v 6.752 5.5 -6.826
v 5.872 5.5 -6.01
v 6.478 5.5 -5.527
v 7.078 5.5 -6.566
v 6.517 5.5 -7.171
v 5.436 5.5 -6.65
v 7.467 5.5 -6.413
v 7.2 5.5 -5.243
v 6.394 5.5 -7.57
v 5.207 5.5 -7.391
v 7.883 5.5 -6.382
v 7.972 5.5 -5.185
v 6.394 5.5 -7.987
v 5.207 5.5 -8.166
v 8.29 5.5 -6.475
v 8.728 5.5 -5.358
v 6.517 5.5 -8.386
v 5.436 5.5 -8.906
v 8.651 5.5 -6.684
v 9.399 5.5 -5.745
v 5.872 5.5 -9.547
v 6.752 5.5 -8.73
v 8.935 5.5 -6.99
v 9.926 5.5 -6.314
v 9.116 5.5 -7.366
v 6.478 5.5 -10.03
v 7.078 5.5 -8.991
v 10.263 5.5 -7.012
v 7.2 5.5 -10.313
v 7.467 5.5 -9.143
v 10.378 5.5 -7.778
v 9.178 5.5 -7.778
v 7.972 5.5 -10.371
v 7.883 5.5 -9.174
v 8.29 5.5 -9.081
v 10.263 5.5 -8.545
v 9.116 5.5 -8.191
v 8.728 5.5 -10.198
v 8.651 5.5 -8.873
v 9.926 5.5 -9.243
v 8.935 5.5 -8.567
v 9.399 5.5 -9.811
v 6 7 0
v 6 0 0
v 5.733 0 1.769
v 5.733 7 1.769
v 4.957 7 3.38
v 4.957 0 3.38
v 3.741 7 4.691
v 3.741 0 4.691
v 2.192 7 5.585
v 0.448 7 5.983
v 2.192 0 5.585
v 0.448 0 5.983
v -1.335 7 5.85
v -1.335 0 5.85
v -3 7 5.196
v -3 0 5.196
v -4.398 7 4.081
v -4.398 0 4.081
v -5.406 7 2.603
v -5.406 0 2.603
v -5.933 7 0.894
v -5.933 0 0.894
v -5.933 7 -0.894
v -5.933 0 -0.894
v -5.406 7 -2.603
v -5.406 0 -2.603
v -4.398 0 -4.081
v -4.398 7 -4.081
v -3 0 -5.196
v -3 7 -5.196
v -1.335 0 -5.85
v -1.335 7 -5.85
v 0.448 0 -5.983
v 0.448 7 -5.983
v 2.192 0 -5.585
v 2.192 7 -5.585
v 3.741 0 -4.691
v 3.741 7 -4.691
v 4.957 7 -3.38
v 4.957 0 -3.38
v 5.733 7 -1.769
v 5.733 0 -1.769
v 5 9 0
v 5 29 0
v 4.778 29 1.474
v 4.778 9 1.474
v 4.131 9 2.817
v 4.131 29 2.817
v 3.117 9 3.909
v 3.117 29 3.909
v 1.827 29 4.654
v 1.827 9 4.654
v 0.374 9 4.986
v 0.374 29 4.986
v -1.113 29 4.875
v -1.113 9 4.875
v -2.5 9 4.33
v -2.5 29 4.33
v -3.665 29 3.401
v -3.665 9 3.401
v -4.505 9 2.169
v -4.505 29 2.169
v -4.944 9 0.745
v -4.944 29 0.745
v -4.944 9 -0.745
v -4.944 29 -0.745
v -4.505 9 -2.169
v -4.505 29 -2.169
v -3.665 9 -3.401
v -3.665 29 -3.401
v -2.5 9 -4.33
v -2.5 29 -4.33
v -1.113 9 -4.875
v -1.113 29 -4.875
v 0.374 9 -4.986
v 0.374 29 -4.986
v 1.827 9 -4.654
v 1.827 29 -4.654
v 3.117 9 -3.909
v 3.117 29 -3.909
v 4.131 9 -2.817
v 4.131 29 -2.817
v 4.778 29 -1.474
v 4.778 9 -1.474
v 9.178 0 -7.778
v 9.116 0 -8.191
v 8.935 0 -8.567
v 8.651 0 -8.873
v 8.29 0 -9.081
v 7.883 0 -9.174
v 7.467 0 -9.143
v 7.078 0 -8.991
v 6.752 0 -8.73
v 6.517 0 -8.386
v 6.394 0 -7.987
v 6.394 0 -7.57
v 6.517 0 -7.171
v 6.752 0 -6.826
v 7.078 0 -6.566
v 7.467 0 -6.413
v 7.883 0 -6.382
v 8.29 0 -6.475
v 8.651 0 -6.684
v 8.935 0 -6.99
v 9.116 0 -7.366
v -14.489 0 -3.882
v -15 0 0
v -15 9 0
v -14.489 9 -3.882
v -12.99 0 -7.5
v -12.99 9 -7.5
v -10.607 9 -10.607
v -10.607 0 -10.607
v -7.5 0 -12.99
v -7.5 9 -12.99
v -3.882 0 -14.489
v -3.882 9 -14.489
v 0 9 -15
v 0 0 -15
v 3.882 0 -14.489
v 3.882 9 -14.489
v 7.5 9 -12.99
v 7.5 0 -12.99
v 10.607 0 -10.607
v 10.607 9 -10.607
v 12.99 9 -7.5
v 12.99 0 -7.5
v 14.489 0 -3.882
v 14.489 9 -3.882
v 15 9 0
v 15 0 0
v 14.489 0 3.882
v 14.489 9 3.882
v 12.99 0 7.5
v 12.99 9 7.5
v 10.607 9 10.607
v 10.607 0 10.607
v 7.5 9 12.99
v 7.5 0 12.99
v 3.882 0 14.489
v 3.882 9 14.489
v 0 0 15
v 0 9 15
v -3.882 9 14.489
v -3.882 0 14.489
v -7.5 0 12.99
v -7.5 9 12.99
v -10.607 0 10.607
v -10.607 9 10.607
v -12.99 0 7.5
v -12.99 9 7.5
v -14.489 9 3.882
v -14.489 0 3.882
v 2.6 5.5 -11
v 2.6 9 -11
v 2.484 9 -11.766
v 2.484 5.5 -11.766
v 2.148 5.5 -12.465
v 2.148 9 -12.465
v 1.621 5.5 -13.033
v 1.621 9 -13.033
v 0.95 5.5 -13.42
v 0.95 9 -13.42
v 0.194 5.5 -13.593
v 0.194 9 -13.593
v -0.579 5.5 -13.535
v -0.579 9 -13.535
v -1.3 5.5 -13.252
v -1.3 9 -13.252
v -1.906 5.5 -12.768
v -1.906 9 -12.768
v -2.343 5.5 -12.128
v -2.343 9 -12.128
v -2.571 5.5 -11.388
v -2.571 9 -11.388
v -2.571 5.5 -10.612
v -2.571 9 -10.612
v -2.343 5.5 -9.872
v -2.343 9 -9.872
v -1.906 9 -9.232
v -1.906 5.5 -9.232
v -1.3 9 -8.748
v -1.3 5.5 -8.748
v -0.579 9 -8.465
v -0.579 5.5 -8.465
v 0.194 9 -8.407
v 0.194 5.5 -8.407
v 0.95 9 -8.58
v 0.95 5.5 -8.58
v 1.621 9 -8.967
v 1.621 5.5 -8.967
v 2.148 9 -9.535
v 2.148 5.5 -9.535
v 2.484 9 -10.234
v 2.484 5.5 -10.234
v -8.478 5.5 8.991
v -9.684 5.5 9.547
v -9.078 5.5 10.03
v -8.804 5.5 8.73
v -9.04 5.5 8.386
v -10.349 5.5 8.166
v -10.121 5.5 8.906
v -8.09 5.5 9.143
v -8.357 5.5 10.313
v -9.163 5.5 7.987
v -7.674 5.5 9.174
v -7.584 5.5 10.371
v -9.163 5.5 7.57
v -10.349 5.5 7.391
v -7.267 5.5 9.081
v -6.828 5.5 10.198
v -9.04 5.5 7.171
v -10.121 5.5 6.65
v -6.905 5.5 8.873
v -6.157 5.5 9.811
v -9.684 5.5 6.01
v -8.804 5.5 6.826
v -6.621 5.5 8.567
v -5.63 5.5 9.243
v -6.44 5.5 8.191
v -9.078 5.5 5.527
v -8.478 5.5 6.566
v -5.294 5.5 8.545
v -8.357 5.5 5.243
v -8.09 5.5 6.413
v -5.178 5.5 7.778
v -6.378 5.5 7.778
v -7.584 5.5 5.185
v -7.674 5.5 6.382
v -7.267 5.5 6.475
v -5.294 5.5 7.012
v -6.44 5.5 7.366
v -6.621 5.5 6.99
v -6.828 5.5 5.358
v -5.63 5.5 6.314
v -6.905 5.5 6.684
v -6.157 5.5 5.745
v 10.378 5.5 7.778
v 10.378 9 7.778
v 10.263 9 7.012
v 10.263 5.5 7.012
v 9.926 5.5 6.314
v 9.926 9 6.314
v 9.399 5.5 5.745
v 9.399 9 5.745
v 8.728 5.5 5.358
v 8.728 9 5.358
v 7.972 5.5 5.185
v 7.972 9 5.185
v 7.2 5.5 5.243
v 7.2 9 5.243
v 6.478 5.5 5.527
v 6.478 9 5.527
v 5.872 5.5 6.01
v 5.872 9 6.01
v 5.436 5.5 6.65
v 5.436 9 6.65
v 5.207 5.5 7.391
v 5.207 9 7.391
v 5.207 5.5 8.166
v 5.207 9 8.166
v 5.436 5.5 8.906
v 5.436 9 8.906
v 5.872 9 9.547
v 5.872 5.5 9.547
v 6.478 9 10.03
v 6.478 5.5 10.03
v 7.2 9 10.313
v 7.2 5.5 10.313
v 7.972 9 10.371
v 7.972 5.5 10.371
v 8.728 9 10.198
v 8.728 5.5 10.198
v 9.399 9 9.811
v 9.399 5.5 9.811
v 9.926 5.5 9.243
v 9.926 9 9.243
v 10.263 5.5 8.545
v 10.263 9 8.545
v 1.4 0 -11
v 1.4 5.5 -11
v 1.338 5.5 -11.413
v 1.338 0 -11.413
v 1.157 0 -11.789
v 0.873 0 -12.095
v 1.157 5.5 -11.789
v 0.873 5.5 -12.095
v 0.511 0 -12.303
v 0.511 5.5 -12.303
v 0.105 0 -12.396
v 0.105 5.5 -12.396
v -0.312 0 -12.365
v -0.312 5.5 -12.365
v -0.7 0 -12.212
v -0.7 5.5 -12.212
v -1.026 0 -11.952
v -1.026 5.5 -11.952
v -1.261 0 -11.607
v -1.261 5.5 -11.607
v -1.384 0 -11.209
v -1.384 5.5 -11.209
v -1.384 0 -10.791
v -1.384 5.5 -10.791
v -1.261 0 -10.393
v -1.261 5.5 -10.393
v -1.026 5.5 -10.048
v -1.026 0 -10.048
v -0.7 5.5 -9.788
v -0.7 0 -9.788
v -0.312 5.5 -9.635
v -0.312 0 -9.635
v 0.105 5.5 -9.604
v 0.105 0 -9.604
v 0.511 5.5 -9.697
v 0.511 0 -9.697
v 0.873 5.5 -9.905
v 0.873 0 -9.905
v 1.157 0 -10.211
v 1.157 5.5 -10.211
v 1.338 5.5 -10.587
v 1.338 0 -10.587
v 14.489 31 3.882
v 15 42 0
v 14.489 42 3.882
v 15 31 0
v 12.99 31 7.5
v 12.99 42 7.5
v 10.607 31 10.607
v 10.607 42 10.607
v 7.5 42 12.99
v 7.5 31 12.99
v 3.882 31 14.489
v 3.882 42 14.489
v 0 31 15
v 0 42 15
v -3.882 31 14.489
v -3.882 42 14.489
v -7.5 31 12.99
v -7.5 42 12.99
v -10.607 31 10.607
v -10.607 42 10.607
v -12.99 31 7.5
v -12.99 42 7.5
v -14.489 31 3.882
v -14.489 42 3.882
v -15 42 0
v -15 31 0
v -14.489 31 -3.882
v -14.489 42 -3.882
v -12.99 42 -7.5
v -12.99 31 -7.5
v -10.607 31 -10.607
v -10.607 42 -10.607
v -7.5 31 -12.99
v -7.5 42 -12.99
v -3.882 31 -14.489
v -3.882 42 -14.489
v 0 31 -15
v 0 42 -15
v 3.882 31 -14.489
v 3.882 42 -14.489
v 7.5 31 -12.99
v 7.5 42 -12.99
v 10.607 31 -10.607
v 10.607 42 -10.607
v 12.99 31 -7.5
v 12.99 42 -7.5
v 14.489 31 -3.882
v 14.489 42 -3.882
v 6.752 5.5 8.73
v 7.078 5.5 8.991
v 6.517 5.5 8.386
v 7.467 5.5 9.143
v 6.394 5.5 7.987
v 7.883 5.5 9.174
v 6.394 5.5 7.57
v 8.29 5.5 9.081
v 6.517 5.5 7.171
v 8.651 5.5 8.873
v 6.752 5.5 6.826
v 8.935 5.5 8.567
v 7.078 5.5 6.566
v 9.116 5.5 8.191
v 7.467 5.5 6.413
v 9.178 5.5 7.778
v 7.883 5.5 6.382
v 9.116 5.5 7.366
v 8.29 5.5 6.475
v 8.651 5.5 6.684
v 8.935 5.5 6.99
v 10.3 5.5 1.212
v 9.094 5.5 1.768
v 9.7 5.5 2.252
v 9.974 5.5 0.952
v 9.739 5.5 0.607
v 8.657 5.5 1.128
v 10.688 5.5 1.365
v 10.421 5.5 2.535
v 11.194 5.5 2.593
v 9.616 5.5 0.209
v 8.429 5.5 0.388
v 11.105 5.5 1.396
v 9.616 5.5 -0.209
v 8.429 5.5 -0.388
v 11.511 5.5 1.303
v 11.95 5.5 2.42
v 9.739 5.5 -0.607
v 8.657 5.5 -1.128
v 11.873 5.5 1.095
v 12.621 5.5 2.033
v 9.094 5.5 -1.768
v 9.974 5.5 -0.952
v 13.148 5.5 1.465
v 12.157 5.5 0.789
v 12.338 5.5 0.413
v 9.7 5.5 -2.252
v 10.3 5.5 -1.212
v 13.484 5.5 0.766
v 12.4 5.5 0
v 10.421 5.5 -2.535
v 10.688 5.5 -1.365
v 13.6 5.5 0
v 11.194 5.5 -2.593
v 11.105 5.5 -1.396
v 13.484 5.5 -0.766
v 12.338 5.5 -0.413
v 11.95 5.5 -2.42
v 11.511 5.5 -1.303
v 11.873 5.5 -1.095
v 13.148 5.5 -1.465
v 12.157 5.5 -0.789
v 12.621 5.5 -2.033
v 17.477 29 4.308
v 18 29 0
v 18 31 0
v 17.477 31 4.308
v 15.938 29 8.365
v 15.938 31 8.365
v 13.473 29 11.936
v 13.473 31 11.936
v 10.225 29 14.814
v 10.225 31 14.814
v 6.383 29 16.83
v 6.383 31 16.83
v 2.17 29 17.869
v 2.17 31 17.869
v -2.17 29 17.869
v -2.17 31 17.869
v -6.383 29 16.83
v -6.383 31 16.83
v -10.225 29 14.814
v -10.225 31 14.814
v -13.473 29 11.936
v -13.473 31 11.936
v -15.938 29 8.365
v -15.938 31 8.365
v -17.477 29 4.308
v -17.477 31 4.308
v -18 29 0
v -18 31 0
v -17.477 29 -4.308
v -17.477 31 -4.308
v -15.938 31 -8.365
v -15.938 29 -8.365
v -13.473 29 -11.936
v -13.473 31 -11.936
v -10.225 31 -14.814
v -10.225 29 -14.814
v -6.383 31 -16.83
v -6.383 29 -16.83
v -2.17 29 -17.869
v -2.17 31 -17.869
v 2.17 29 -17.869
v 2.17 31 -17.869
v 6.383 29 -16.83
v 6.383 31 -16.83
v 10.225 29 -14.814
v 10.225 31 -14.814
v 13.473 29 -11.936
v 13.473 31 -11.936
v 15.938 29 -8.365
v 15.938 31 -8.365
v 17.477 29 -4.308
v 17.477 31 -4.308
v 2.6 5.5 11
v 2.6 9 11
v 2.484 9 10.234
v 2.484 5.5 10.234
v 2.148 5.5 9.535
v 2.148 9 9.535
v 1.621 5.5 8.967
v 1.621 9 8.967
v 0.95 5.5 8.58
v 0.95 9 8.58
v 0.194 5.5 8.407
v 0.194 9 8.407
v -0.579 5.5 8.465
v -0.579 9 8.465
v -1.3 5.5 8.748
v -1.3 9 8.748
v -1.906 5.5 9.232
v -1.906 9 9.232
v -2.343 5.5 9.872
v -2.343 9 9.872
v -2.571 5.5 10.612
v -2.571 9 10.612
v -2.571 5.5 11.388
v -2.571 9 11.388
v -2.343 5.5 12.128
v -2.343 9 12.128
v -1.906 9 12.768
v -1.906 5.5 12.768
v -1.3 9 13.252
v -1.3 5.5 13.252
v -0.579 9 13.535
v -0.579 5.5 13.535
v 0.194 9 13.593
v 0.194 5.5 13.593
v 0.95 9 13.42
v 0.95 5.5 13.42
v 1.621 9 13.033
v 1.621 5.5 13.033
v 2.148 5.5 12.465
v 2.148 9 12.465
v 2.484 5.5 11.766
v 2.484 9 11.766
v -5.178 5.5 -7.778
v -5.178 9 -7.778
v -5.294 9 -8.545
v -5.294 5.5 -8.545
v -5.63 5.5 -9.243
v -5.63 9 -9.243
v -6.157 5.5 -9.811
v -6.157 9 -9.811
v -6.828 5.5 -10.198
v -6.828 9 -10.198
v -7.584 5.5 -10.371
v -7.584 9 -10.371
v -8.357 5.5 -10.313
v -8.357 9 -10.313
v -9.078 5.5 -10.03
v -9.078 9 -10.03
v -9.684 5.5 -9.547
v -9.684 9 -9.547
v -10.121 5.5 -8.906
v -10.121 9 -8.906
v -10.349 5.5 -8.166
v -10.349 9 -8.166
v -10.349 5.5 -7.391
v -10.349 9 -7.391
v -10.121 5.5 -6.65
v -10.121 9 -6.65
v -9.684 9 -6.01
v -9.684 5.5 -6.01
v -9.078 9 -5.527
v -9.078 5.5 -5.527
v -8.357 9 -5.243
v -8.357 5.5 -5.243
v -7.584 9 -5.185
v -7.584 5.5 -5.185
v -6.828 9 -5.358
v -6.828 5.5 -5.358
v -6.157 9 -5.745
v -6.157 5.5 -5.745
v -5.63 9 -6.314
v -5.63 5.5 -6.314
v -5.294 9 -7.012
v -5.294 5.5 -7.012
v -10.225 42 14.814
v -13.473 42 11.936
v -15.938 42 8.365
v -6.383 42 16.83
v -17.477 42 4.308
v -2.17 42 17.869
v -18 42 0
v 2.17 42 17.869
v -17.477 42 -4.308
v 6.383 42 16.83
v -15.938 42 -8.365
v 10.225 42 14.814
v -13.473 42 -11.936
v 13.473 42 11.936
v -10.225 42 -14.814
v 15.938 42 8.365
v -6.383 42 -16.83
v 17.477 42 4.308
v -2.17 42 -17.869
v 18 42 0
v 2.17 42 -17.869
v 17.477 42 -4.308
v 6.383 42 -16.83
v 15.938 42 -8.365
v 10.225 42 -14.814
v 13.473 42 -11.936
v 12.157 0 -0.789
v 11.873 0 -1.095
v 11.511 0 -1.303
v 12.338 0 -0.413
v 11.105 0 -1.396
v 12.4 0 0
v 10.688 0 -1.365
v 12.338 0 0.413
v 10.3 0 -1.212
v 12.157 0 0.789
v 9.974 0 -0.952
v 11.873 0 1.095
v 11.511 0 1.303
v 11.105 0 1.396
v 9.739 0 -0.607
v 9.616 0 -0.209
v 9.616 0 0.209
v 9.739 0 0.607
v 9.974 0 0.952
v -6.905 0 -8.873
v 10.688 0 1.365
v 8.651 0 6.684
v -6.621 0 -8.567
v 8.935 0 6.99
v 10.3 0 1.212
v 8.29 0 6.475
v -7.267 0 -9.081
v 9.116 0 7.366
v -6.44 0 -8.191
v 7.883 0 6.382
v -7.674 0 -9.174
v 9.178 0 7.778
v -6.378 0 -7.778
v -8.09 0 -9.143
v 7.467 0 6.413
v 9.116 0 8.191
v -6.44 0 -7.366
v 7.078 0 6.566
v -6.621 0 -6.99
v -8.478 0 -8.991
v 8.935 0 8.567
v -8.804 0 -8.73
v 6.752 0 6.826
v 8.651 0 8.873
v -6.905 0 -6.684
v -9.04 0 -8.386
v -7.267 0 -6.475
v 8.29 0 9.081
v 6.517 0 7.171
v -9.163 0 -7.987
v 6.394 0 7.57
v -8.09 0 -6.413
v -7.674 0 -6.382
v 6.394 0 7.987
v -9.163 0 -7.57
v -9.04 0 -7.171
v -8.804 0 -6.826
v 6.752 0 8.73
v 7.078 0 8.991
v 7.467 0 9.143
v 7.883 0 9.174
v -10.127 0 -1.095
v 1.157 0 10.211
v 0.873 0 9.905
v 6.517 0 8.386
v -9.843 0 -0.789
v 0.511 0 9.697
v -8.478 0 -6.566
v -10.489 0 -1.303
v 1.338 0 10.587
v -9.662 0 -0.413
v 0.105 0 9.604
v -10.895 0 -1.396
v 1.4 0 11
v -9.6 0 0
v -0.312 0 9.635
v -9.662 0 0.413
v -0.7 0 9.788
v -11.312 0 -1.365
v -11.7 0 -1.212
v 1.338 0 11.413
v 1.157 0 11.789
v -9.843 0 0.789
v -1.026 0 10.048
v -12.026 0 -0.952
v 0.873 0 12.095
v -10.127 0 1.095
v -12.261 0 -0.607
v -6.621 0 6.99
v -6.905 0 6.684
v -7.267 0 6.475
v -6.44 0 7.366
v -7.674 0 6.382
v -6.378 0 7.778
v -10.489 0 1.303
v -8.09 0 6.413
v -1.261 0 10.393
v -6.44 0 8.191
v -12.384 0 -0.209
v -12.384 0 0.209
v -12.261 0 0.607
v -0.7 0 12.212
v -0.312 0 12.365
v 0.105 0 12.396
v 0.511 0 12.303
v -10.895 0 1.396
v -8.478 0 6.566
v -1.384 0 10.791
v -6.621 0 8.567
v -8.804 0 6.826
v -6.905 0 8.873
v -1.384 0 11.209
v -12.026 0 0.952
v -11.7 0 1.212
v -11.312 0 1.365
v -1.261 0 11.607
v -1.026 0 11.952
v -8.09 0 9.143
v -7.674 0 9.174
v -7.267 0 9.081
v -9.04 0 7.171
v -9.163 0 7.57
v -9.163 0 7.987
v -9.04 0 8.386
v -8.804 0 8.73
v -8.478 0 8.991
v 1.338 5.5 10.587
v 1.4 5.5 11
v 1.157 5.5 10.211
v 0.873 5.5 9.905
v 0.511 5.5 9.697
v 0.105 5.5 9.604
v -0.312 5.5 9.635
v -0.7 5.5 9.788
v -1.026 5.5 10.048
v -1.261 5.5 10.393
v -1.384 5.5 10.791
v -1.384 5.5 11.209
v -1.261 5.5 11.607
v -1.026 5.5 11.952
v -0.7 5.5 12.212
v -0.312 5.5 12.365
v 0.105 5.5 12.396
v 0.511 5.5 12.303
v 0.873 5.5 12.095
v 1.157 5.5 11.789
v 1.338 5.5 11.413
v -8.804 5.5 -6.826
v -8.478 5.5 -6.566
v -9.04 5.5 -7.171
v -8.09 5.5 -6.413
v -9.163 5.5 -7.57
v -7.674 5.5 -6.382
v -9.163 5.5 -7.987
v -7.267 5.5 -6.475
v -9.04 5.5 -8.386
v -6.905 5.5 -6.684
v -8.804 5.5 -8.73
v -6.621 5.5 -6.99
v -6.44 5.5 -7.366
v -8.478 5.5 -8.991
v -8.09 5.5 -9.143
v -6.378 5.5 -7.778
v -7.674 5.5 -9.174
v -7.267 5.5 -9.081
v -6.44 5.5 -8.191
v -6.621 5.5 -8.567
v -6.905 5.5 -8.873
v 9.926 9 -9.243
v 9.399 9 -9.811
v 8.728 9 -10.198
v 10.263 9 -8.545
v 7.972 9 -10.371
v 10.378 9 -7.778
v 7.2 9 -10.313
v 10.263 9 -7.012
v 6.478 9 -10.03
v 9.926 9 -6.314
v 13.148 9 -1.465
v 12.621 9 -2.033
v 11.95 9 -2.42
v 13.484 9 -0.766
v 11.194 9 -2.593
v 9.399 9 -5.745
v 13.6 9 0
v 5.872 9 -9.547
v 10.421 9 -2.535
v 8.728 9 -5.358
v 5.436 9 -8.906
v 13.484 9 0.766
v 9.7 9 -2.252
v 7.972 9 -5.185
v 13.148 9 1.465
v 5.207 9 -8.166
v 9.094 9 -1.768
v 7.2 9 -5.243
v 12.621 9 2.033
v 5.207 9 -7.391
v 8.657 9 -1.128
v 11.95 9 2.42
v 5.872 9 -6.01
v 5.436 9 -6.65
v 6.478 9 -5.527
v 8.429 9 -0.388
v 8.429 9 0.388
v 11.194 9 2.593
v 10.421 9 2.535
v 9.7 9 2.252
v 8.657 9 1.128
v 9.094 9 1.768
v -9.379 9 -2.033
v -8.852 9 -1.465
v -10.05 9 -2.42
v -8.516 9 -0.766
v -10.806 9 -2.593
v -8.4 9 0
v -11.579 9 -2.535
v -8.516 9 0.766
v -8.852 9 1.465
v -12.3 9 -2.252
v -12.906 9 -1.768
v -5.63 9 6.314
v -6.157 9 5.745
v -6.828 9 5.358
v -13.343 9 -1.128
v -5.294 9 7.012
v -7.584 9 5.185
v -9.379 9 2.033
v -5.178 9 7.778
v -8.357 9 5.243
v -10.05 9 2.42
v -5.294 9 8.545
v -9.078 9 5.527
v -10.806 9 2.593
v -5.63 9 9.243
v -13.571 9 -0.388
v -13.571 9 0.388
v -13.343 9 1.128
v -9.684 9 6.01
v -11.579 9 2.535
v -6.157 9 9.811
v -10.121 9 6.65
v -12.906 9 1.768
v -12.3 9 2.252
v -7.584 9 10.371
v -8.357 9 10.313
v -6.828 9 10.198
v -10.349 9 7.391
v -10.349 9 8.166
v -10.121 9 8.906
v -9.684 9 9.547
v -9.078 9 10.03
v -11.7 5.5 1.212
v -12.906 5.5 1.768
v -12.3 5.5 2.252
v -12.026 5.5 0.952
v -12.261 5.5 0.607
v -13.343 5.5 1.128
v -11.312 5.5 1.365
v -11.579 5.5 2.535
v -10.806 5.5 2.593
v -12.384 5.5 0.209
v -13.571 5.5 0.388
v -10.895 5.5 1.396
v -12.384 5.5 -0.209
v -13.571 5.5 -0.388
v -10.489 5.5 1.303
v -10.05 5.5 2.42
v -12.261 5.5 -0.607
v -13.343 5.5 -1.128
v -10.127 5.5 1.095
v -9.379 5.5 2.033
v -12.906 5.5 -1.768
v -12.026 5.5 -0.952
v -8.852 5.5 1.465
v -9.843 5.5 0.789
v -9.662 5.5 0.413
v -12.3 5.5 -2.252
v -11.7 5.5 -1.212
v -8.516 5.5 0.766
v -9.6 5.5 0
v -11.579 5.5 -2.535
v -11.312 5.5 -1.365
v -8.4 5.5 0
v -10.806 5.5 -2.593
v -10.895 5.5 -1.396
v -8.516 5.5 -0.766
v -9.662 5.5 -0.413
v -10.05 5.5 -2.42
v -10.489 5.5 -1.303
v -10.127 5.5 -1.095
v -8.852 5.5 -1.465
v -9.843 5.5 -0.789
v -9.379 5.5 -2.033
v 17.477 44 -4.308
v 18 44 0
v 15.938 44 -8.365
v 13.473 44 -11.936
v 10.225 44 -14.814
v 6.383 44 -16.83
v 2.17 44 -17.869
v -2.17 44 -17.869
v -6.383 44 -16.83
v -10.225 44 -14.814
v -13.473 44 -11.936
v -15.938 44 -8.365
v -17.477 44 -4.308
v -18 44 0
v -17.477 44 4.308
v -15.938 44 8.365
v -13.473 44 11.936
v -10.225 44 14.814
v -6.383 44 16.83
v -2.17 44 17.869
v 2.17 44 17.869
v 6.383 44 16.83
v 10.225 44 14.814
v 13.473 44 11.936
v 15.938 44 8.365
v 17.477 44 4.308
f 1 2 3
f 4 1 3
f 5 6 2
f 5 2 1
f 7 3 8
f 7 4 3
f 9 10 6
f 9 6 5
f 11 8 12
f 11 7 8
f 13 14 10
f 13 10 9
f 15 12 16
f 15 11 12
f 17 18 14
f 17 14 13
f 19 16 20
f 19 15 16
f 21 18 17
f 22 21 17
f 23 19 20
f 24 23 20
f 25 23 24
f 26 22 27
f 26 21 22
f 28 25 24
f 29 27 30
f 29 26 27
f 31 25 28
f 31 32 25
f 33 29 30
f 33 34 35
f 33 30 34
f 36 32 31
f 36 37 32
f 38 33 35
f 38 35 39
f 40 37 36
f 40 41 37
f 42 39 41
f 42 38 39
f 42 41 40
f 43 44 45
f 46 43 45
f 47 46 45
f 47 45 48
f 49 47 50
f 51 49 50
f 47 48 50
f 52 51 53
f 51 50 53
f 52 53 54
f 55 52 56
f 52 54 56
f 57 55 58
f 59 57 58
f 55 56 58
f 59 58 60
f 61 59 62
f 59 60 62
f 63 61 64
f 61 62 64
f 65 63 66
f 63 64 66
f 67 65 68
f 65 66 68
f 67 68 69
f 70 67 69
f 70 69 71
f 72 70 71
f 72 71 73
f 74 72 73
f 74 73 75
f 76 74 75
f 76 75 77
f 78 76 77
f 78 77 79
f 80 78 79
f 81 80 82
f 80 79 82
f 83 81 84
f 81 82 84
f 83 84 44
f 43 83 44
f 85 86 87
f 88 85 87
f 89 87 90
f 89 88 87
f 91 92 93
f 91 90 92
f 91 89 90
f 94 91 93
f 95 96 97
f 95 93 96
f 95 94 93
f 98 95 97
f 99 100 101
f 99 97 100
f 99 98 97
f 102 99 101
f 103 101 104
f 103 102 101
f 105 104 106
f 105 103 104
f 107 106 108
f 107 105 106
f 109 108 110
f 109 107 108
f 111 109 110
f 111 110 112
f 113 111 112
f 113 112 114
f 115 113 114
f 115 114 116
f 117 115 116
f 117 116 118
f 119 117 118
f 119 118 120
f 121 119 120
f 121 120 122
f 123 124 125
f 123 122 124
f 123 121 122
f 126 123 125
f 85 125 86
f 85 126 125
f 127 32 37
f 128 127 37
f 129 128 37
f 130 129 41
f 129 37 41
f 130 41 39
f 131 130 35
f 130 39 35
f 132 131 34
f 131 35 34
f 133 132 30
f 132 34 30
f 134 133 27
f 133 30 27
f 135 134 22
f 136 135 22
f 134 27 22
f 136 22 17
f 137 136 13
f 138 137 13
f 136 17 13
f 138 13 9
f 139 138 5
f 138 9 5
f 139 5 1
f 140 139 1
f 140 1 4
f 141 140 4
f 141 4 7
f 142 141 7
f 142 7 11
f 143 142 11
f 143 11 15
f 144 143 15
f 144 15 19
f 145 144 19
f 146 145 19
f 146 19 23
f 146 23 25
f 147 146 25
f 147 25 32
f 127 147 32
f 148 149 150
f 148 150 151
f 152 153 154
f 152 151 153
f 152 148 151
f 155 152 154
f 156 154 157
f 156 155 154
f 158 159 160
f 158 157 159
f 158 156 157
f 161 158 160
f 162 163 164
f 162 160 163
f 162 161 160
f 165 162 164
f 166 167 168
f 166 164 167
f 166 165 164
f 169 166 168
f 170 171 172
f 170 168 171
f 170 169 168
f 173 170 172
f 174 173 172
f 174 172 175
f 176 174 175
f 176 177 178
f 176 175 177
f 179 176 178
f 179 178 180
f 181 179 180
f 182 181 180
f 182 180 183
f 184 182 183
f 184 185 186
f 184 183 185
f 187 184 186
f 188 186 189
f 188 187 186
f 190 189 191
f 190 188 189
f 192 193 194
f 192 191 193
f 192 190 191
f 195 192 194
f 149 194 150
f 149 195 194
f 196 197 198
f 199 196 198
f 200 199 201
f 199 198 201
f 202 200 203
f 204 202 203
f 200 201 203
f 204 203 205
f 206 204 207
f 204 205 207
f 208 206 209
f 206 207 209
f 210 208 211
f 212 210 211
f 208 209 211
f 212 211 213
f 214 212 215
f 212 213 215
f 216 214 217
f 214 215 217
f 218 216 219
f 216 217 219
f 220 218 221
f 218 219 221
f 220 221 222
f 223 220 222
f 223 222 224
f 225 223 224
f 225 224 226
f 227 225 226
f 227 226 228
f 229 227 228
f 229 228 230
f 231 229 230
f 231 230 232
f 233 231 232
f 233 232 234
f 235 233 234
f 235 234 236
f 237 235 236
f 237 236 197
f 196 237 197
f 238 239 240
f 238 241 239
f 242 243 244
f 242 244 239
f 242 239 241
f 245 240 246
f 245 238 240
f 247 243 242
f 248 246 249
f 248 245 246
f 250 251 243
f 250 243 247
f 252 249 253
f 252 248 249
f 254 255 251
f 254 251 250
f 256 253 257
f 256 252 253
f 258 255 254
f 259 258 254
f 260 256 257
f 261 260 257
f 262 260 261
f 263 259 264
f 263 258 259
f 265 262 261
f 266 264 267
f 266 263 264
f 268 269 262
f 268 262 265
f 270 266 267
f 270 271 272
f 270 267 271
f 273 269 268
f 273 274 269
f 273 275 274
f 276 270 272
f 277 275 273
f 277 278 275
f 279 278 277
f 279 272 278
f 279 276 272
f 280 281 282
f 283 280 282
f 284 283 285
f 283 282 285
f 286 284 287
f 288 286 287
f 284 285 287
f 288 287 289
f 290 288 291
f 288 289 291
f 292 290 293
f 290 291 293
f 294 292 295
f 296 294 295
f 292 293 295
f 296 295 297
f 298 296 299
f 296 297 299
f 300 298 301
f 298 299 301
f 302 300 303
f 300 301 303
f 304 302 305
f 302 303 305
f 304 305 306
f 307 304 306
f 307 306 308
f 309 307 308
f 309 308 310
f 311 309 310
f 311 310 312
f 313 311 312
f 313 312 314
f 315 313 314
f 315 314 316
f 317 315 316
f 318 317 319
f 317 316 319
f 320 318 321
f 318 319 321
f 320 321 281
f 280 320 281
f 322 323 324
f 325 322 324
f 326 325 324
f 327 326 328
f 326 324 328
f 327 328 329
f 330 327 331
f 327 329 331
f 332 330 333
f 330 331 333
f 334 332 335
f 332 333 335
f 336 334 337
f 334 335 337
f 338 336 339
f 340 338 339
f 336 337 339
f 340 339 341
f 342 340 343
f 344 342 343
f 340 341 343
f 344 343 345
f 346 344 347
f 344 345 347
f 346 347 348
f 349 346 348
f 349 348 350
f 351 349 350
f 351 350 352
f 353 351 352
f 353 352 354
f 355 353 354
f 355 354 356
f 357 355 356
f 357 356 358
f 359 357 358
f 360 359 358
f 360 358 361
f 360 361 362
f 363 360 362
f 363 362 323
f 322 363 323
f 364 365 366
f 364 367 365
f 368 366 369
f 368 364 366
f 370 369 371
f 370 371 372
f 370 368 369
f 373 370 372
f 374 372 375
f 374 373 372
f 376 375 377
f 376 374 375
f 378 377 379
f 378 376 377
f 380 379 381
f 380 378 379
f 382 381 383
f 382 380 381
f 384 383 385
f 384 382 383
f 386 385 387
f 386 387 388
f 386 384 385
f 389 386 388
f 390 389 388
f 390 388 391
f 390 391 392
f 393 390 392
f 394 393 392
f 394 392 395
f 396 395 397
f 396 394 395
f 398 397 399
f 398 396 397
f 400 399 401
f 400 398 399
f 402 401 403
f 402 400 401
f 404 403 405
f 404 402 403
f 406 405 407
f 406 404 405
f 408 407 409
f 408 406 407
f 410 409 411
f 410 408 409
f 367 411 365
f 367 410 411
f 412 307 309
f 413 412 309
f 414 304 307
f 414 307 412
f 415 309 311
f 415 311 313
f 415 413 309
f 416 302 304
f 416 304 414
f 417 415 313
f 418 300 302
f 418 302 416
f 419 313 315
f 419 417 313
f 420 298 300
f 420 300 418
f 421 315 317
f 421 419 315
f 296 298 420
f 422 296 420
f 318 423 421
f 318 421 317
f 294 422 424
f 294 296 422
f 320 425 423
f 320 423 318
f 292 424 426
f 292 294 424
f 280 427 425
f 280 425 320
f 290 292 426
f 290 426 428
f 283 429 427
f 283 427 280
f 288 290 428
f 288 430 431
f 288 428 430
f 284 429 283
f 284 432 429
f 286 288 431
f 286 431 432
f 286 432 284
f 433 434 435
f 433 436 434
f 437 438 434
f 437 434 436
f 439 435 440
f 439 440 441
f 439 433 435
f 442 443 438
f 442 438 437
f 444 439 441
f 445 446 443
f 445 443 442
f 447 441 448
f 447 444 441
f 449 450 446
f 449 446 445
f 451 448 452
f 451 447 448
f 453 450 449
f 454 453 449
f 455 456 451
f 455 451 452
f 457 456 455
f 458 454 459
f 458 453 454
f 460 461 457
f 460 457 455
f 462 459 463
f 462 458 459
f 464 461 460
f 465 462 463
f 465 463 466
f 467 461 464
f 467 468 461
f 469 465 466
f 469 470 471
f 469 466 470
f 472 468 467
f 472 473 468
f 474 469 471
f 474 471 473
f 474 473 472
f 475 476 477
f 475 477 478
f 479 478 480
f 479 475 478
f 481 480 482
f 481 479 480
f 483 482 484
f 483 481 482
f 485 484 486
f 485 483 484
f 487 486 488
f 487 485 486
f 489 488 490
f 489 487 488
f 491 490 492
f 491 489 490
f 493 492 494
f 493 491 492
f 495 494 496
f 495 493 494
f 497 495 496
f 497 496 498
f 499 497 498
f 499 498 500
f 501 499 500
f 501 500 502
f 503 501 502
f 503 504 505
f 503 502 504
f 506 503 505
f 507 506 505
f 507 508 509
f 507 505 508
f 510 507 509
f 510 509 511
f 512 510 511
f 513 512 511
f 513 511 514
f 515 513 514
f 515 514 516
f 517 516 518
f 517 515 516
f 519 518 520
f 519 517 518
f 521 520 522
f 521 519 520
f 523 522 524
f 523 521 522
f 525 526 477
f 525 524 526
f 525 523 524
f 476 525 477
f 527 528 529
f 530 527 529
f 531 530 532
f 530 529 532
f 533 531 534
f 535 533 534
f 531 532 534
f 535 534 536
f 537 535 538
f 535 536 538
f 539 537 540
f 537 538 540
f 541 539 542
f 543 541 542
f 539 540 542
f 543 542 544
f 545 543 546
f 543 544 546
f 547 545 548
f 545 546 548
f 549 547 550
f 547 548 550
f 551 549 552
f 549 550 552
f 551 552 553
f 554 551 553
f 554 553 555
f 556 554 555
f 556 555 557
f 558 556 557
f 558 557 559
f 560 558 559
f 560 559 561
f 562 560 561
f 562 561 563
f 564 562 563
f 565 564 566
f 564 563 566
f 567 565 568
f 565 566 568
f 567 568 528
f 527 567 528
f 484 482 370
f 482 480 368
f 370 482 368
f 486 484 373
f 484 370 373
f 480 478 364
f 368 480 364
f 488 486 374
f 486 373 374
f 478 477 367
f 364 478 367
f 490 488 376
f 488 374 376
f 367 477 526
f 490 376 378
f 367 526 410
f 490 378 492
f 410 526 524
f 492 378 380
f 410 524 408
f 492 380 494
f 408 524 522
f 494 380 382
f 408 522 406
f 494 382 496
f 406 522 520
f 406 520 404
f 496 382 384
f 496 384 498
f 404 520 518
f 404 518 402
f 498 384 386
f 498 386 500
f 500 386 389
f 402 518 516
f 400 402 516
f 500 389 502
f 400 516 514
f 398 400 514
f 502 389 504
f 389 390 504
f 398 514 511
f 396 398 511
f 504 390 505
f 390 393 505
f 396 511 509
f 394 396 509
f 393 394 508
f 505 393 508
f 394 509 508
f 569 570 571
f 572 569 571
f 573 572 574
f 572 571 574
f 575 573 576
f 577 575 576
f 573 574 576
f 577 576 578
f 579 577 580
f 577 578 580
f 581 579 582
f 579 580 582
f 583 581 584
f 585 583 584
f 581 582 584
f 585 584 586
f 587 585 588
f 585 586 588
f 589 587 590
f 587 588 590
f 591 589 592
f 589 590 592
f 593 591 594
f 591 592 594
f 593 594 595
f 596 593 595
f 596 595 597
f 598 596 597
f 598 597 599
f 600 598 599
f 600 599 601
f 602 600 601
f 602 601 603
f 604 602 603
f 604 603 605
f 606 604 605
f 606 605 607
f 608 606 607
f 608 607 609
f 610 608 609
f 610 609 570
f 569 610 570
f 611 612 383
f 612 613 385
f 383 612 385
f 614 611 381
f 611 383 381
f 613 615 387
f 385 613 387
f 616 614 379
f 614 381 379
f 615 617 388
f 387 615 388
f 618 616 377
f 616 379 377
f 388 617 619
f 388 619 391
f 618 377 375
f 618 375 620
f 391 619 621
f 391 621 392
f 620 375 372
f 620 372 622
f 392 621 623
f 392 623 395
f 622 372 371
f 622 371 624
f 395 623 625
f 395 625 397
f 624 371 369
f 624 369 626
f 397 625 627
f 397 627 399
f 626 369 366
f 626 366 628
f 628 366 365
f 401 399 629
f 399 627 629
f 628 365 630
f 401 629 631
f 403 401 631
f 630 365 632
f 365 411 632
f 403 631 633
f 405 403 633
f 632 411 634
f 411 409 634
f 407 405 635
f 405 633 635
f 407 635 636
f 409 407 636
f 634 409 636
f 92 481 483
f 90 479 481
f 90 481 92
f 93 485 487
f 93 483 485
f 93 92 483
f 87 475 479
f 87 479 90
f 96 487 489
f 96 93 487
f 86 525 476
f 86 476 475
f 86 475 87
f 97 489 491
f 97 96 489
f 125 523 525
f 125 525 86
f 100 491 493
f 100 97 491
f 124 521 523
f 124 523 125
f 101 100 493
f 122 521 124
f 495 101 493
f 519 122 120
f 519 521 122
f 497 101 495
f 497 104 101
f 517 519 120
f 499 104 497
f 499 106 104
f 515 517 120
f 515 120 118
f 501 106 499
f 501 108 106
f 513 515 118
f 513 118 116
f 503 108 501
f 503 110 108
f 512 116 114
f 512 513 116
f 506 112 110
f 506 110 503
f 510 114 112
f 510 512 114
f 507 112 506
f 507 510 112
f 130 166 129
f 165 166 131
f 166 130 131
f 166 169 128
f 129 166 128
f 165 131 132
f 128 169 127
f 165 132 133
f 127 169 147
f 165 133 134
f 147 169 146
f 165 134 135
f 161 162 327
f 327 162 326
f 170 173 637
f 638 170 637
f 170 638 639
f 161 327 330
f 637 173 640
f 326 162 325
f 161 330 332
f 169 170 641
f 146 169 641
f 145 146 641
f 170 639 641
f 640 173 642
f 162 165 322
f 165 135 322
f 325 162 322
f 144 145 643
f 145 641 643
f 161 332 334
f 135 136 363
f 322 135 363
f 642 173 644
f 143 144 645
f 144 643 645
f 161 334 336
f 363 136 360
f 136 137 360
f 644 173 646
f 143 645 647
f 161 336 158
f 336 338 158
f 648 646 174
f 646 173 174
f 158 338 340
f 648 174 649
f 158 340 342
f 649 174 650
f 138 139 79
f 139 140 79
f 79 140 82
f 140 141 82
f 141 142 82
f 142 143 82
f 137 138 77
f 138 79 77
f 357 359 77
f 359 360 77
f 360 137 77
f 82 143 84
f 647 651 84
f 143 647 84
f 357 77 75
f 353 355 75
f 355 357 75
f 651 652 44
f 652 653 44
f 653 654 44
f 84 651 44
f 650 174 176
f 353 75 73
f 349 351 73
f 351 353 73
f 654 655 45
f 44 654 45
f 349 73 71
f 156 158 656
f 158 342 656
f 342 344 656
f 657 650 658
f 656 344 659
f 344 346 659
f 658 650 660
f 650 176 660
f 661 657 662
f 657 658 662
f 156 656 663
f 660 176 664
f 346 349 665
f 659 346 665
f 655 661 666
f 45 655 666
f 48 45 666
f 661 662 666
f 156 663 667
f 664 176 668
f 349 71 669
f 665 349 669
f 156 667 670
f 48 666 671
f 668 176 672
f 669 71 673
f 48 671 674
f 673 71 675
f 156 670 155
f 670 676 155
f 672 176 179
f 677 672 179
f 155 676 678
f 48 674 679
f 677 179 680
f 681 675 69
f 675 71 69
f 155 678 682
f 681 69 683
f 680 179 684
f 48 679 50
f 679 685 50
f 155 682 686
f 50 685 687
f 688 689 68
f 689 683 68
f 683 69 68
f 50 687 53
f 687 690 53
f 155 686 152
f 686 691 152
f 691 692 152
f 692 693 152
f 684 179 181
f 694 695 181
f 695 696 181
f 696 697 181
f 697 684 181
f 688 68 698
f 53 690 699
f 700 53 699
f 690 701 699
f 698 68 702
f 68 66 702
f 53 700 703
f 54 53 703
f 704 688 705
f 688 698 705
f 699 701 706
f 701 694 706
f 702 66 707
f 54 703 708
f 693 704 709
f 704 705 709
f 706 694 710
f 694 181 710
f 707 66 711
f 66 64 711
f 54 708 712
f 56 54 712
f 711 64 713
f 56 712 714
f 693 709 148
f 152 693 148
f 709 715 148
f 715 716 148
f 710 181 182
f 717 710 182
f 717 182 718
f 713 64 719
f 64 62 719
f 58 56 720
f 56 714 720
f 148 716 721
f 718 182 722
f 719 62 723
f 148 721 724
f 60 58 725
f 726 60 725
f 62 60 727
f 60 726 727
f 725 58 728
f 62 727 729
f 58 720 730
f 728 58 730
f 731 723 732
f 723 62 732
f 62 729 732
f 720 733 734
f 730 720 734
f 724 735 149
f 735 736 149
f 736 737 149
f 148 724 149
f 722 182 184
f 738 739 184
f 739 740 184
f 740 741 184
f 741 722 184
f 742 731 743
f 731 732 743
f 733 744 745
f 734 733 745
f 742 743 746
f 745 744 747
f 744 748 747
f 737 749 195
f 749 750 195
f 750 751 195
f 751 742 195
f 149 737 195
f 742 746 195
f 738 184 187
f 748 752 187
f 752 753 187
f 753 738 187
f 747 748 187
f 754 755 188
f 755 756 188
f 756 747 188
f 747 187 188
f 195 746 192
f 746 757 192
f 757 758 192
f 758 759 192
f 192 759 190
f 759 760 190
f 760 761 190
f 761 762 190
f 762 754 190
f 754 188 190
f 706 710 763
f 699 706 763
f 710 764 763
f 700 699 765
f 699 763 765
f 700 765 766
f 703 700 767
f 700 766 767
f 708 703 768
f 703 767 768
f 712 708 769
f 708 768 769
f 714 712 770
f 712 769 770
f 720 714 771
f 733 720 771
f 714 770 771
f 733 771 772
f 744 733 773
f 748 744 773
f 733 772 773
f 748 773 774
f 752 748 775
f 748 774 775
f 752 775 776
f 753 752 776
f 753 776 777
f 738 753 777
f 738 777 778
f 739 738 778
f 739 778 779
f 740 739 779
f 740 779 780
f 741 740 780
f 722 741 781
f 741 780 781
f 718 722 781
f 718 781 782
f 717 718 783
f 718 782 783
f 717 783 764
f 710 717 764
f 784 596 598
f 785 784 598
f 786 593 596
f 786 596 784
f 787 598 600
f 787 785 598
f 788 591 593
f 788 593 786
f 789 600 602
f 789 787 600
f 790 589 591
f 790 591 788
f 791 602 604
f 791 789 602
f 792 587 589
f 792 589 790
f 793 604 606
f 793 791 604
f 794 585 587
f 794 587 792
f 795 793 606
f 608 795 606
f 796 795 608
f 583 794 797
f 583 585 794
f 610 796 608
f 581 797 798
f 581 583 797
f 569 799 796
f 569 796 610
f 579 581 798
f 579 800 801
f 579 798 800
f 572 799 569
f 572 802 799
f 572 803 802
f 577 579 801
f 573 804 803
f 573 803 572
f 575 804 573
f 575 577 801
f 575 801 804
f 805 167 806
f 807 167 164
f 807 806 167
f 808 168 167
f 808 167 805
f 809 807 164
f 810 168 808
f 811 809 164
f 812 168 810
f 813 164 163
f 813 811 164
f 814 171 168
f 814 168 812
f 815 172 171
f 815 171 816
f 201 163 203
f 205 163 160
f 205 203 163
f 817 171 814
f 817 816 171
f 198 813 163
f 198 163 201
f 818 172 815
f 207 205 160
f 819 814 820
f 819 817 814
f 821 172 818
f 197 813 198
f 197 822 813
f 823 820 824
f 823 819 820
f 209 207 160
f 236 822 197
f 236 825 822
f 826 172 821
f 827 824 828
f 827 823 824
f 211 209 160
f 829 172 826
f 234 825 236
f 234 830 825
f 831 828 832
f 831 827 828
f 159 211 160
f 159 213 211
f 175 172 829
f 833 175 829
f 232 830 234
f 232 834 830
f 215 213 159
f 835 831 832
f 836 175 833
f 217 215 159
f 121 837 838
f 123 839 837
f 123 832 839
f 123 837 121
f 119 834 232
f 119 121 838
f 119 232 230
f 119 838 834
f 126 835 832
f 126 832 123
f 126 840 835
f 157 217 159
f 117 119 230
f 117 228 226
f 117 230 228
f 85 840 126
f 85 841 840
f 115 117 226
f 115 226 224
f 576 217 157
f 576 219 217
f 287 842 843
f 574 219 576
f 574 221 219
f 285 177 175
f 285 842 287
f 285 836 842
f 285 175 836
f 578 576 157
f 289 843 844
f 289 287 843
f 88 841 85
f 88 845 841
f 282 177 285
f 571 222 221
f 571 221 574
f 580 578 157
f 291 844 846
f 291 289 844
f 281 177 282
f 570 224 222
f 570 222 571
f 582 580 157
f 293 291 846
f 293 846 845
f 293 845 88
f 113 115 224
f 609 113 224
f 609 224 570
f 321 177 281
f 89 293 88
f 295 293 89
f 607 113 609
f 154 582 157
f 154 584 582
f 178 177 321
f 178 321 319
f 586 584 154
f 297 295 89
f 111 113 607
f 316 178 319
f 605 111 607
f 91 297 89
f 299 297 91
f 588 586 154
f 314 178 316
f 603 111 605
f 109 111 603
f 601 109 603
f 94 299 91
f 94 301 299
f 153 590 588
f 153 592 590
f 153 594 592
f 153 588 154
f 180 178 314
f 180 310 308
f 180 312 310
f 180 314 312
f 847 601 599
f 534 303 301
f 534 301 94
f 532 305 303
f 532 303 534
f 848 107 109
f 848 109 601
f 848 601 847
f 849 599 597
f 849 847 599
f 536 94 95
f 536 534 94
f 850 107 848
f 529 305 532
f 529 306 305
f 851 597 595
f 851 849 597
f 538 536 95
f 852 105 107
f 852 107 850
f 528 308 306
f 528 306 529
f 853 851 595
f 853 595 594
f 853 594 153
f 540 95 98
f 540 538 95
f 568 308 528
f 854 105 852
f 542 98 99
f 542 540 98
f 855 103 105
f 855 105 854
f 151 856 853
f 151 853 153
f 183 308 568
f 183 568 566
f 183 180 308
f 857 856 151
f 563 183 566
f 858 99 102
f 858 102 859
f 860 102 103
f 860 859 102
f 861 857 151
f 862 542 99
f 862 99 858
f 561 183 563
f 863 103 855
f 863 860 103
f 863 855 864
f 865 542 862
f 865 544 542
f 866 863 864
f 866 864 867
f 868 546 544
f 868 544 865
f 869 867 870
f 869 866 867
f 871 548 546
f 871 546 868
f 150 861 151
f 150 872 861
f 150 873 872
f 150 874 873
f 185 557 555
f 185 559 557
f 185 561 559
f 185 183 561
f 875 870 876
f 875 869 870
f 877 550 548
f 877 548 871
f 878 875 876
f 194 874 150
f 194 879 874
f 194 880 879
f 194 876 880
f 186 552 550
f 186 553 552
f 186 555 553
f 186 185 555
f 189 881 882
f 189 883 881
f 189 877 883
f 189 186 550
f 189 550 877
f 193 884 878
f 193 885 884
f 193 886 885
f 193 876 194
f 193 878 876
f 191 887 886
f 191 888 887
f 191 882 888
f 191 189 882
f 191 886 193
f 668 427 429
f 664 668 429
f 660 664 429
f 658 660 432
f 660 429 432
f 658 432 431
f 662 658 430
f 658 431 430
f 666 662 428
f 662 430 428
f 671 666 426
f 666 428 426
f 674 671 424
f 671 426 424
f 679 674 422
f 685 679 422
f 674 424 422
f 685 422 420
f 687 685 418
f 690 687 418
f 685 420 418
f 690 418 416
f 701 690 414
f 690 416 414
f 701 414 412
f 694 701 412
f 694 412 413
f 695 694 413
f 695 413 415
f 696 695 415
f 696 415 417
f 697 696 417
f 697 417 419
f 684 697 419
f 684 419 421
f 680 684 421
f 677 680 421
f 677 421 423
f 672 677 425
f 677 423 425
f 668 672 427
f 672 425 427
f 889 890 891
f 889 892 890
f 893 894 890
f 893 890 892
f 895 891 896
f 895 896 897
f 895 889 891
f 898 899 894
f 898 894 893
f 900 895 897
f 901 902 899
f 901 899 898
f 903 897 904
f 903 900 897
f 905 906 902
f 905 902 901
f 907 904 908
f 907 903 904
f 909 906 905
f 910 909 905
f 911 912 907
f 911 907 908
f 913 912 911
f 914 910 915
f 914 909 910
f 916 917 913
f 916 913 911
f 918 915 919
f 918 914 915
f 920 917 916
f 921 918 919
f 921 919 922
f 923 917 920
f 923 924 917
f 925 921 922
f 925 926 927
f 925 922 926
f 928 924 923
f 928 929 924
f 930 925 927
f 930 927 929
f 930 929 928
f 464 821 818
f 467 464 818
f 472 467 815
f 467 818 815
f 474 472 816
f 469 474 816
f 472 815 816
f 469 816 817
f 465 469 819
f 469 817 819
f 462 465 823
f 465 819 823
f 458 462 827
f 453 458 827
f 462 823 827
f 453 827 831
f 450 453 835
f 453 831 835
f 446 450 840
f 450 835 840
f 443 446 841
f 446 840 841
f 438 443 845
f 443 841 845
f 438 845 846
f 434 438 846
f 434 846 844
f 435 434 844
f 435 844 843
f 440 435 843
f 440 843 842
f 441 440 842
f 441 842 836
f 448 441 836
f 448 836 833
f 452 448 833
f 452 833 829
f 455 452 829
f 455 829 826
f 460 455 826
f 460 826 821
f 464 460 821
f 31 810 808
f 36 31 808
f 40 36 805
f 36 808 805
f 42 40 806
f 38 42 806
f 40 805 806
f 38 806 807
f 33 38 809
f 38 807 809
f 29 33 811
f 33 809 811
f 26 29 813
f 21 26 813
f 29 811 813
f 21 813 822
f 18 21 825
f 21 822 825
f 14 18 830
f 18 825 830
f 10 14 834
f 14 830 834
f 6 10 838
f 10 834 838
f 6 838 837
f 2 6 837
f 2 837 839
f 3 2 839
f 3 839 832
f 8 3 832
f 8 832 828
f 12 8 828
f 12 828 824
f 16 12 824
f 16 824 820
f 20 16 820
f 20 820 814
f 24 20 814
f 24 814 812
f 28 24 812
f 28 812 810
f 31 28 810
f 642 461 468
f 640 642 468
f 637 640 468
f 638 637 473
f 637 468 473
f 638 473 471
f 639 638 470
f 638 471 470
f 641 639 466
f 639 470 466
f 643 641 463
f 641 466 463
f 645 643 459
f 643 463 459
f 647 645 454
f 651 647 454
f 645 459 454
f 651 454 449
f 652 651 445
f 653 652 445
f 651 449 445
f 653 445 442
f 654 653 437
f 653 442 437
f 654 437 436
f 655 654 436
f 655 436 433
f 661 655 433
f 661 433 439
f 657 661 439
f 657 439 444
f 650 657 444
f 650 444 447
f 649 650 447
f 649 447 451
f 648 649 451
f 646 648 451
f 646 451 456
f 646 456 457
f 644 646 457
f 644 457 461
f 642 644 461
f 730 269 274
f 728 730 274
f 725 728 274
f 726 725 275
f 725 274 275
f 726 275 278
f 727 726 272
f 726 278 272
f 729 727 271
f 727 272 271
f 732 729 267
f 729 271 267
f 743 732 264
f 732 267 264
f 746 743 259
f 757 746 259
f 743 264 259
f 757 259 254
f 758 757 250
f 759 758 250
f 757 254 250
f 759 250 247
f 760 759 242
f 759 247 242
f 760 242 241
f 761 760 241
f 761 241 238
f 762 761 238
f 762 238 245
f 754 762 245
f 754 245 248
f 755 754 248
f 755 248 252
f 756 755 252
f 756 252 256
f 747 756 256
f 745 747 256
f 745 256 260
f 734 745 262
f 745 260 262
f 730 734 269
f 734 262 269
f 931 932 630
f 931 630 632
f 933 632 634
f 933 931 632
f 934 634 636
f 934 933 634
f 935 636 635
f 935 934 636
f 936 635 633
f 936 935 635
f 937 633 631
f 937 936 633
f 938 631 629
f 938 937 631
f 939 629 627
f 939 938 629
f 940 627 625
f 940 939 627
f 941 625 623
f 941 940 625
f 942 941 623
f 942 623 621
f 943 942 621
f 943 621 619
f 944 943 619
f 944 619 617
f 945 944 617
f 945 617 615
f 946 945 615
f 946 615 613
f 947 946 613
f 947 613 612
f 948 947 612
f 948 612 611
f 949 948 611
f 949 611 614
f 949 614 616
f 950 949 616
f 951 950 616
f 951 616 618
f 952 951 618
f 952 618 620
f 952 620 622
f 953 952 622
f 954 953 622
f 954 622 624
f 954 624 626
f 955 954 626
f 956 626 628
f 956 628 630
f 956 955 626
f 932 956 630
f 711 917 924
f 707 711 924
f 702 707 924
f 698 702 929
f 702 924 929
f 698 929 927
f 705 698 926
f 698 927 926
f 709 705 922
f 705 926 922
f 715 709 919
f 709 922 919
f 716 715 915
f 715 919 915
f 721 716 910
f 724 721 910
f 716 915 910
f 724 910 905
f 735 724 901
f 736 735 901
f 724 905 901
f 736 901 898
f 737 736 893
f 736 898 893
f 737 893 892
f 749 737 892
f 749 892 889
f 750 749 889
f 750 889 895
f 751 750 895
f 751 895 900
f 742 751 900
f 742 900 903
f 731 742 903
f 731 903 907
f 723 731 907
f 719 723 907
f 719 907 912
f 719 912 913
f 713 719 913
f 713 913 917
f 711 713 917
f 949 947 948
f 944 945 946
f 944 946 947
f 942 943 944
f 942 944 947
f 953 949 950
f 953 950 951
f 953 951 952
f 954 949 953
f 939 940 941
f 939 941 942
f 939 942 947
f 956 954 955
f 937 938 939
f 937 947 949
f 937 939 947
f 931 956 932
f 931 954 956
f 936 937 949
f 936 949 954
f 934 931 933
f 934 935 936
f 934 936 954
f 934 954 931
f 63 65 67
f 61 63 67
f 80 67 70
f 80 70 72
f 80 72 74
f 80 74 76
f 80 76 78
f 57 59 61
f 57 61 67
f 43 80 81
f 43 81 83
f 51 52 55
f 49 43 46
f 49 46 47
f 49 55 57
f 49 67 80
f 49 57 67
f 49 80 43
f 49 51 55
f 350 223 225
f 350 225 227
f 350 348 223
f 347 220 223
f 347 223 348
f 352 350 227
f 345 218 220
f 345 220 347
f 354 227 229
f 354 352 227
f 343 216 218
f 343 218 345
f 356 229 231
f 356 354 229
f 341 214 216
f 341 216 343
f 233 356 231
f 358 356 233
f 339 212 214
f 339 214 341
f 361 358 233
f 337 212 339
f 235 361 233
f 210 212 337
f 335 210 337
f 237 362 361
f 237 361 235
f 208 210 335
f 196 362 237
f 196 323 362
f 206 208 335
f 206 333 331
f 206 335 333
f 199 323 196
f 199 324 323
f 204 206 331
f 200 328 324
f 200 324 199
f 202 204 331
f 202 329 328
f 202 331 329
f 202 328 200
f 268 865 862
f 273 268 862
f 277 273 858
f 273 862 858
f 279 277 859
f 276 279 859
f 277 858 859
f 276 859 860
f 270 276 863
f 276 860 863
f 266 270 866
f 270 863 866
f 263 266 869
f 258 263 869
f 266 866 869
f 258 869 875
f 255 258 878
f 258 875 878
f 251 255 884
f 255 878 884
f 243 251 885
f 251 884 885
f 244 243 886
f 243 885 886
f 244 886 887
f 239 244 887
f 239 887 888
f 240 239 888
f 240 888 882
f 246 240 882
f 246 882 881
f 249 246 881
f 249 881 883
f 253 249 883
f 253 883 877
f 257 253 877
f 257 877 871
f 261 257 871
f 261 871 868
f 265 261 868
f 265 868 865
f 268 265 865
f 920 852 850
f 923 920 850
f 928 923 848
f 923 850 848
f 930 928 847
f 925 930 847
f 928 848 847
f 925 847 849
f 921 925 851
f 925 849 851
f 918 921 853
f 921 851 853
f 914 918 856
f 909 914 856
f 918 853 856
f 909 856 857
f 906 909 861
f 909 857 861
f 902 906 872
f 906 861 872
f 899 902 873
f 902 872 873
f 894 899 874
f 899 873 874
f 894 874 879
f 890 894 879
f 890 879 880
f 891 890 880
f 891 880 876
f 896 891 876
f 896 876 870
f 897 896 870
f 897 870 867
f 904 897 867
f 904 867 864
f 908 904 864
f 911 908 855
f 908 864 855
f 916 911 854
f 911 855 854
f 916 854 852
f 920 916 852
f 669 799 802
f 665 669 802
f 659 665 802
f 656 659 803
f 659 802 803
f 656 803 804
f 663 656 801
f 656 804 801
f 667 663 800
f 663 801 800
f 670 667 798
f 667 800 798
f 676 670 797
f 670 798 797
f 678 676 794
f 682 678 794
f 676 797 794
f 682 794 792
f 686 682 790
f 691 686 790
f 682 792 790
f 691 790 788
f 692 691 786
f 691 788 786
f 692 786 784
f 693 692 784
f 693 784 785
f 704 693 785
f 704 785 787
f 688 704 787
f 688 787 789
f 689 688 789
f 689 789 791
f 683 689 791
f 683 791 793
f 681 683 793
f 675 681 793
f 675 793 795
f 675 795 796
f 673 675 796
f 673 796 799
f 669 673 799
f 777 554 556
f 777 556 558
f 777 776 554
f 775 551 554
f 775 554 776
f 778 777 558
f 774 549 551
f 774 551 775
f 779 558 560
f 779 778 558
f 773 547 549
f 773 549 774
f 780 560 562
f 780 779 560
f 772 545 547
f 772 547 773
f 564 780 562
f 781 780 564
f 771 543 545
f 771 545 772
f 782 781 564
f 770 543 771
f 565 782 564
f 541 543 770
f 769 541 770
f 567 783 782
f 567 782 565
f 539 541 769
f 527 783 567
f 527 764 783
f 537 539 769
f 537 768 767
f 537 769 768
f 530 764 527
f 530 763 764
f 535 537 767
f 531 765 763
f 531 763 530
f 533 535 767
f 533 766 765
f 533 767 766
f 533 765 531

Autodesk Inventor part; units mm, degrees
ref_plane "YZ Plane" through (0, 0, 0) normal (1, 0, 0) x (0, 1, 0)
ref_plane "XZ Plane" through (0, 0, 0) normal (0, 1, 0) x (-1, 0, 0)
ref_plane "XY Plane" through (0, 0, 0) normal (0, 0, 1) x (1, 0, 0)
sketch "Sketch1" plane through (0, 0, 0) normal (0, 1, 0) x (-1, 0, 0)
  circle A0 centre (0, 0) radius 15
  dimension "d0" = 30
extrude "Extrusion1" add sketch "Sketch1" along normal blind 9
sketch "Sketch3" plane through (0, 9, 0) normal (0, 1, 0) x (1, 0, 0)
  circle A0 centre (0, 0) radius 11 construction
  line L0 (0, 0) -> (0, 11) construction
  line L1 (0, 11) -> (7.7782, 7.7782) construction
  line L2 (7.7782, 7.7782) -> (11, 0) construction
  line L3 (11, 0) -> (7.7782, -7.7782) construction
  line L4 (7.7782, -7.7782) -> (0, -11) construction
  line L5 (0, -11) -> (-7.7782, -7.7782) construction
  line L6 (-7.7782, -7.7782) -> (-11, 0) construction
  line L7 (-11, 0) -> (-7.7782, 7.7782) construction
  line L8 (-7.7782, 7.7782) -> (0, 11) construction
  circle A1 centre (-11, 0) radius 1.4
  circle A2 centre (-7.7782, 7.7782) radius 1.4
  circle A3 centre (-7.7782, -7.7782) radius 1.4
  circle A4 centre (0, -11) radius 1.4
  circle A5 centre (7.7782, -7.7782) radius 1.4
  circle A6 centre (11, 0) radius 1.4
  circle A7 centre (7.7782, 7.7782) radius 1.4
  circle A8 centre (0, 11) radius 1.4
  dimension "d12" = 22
  dimension "d13" = 2.8
  dimension "d14" = 2.8
  dimension "d15" = 2.8
  dimension "d16" = 2.8
  dimension "d17" = 2.8
  dimension "d18" = 2.8
  dimension "d19" = 2.8
  dimension "d20" = 2.8
extrude "Extrusion3" cut sketch "Sketch3" against normal up to next
sketch "Sketch4" plane through (0, 9, 0) normal (0, 1, 0) x (1, 0, 0)
  circle A0 centre (-11, 0) radius 1.4 construction
  circle A1 centre (0, 0) radius 11 construction
  line L0 (0, 0) -> (-11, 0) construction
  line L1 (-11, 0) -> (-7.7782, 7.7782) construction
  line L2 (-7.7782, 7.7782) -> (0, 11) construction
  line L3 (0, 11) -> (7.7782, 7.7782) construction
  line L4 (7.7782, 7.7782) -> (11, 0) construction
  line L5 (11, 0) -> (7.7782, -7.7782) construction
  line L6 (7.7782, -7.7782) -> (0, -11) construction
  line L7 (0, -11) -> (-7.7782, -7.7782) construction
  line L8 (-7.7782, -7.7782) -> (-11, 0) construction
  circle A2 centre (-11, 0) radius 2.6
  circle A3 centre (-7.7782, 7.7782) radius 1.4 projected
  circle A4 centre (-7.7782, 7.7782) radius 2.6
  circle A5 centre (0, 11) radius 2.6
  circle A6 centre (7.7782, 7.7782) radius 2.6
  circle A7 centre (11, 0) radius 2.6
  circle A8 centre (7.7782, -7.7782) radius 1.4 projected
  circle A9 centre (7.7782, -7.7782) radius 2.6
  circle A10 centre (0, -11) radius 1.4 projected
  circle A11 centre (0, -11) radius 2.6
  circle A12 centre (-7.7782, -7.7782) radius 2.6
  dimension "d23" = 5.2
  dimension "d24" = 5.2
  dimension "d25" = 5.2
  dimension "d26" = 5.2
  dimension "d27" = 5.2
  dimension "d28" = 5.2
  dimension "d29" = 5.2
  dimension "d30" = 5.2
extrude "Extrusion4" cut sketch "Sketch4" against normal blind 3.5
sketch "Sketch5" plane through (0, 0, 0) normal (0, -1, 0) x (1, 0, 0)
  circle A0 centre (0, 0) radius 6
  dimension "d33" = 12
extrude "Extrusion5" cut sketch "Sketch5" against normal blind 7
sketch "Skizze6" plane through (0, 9, 0) normal (0, 1, 0) x (1, 0, 0)
  circle A0 centre (0, 0) radius 6 projected
  circle A1 centre (0, 0) radius 5
  dimension "d36" = 10
extrude "Extrusion6" add sketch "Skizze6" along normal blind 20 contours A1
sketch "Skizze9" plane through (0, 29, 0) normal (0, 1, 0) x (1, 0, 0)
  circle A0 centre (0, 0) radius 15 construction
  circle A1 centre (0, 0) radius 6 construction
  line L0 (0, 0) -> (0, -15) construction
  line L1 (0, 0) -> (0, -15) construction
  circle A2 centre (0, 0) radius 15
extrude "Extrusion7" add sketch "Skizze9" along normal blind 15
sketch "Skizze10" plane through (0, 44, 0) normal (0, 1, 0) x (1, 0, 0)
  line L0 (0, 0) -> (0, -18) construction
  circle A0 centre (0, 0) radius 5 projected
  circle A1 centre (0, 0) radius 18
  dimension "d44" = 18
extrude "Extrusion8" add sketch "Skizze10" against normal blind 2
ref_plane "Arbeitsebene2" through (0, 36.5, 0) normal (0, 1, 0) x (1, 0, 0)
mirror "Spiegeln1" about plane through (0, 36.5, 0) normal (0, 1, 0) of "Extrusion8"
properties part number "spinning_wheel"
